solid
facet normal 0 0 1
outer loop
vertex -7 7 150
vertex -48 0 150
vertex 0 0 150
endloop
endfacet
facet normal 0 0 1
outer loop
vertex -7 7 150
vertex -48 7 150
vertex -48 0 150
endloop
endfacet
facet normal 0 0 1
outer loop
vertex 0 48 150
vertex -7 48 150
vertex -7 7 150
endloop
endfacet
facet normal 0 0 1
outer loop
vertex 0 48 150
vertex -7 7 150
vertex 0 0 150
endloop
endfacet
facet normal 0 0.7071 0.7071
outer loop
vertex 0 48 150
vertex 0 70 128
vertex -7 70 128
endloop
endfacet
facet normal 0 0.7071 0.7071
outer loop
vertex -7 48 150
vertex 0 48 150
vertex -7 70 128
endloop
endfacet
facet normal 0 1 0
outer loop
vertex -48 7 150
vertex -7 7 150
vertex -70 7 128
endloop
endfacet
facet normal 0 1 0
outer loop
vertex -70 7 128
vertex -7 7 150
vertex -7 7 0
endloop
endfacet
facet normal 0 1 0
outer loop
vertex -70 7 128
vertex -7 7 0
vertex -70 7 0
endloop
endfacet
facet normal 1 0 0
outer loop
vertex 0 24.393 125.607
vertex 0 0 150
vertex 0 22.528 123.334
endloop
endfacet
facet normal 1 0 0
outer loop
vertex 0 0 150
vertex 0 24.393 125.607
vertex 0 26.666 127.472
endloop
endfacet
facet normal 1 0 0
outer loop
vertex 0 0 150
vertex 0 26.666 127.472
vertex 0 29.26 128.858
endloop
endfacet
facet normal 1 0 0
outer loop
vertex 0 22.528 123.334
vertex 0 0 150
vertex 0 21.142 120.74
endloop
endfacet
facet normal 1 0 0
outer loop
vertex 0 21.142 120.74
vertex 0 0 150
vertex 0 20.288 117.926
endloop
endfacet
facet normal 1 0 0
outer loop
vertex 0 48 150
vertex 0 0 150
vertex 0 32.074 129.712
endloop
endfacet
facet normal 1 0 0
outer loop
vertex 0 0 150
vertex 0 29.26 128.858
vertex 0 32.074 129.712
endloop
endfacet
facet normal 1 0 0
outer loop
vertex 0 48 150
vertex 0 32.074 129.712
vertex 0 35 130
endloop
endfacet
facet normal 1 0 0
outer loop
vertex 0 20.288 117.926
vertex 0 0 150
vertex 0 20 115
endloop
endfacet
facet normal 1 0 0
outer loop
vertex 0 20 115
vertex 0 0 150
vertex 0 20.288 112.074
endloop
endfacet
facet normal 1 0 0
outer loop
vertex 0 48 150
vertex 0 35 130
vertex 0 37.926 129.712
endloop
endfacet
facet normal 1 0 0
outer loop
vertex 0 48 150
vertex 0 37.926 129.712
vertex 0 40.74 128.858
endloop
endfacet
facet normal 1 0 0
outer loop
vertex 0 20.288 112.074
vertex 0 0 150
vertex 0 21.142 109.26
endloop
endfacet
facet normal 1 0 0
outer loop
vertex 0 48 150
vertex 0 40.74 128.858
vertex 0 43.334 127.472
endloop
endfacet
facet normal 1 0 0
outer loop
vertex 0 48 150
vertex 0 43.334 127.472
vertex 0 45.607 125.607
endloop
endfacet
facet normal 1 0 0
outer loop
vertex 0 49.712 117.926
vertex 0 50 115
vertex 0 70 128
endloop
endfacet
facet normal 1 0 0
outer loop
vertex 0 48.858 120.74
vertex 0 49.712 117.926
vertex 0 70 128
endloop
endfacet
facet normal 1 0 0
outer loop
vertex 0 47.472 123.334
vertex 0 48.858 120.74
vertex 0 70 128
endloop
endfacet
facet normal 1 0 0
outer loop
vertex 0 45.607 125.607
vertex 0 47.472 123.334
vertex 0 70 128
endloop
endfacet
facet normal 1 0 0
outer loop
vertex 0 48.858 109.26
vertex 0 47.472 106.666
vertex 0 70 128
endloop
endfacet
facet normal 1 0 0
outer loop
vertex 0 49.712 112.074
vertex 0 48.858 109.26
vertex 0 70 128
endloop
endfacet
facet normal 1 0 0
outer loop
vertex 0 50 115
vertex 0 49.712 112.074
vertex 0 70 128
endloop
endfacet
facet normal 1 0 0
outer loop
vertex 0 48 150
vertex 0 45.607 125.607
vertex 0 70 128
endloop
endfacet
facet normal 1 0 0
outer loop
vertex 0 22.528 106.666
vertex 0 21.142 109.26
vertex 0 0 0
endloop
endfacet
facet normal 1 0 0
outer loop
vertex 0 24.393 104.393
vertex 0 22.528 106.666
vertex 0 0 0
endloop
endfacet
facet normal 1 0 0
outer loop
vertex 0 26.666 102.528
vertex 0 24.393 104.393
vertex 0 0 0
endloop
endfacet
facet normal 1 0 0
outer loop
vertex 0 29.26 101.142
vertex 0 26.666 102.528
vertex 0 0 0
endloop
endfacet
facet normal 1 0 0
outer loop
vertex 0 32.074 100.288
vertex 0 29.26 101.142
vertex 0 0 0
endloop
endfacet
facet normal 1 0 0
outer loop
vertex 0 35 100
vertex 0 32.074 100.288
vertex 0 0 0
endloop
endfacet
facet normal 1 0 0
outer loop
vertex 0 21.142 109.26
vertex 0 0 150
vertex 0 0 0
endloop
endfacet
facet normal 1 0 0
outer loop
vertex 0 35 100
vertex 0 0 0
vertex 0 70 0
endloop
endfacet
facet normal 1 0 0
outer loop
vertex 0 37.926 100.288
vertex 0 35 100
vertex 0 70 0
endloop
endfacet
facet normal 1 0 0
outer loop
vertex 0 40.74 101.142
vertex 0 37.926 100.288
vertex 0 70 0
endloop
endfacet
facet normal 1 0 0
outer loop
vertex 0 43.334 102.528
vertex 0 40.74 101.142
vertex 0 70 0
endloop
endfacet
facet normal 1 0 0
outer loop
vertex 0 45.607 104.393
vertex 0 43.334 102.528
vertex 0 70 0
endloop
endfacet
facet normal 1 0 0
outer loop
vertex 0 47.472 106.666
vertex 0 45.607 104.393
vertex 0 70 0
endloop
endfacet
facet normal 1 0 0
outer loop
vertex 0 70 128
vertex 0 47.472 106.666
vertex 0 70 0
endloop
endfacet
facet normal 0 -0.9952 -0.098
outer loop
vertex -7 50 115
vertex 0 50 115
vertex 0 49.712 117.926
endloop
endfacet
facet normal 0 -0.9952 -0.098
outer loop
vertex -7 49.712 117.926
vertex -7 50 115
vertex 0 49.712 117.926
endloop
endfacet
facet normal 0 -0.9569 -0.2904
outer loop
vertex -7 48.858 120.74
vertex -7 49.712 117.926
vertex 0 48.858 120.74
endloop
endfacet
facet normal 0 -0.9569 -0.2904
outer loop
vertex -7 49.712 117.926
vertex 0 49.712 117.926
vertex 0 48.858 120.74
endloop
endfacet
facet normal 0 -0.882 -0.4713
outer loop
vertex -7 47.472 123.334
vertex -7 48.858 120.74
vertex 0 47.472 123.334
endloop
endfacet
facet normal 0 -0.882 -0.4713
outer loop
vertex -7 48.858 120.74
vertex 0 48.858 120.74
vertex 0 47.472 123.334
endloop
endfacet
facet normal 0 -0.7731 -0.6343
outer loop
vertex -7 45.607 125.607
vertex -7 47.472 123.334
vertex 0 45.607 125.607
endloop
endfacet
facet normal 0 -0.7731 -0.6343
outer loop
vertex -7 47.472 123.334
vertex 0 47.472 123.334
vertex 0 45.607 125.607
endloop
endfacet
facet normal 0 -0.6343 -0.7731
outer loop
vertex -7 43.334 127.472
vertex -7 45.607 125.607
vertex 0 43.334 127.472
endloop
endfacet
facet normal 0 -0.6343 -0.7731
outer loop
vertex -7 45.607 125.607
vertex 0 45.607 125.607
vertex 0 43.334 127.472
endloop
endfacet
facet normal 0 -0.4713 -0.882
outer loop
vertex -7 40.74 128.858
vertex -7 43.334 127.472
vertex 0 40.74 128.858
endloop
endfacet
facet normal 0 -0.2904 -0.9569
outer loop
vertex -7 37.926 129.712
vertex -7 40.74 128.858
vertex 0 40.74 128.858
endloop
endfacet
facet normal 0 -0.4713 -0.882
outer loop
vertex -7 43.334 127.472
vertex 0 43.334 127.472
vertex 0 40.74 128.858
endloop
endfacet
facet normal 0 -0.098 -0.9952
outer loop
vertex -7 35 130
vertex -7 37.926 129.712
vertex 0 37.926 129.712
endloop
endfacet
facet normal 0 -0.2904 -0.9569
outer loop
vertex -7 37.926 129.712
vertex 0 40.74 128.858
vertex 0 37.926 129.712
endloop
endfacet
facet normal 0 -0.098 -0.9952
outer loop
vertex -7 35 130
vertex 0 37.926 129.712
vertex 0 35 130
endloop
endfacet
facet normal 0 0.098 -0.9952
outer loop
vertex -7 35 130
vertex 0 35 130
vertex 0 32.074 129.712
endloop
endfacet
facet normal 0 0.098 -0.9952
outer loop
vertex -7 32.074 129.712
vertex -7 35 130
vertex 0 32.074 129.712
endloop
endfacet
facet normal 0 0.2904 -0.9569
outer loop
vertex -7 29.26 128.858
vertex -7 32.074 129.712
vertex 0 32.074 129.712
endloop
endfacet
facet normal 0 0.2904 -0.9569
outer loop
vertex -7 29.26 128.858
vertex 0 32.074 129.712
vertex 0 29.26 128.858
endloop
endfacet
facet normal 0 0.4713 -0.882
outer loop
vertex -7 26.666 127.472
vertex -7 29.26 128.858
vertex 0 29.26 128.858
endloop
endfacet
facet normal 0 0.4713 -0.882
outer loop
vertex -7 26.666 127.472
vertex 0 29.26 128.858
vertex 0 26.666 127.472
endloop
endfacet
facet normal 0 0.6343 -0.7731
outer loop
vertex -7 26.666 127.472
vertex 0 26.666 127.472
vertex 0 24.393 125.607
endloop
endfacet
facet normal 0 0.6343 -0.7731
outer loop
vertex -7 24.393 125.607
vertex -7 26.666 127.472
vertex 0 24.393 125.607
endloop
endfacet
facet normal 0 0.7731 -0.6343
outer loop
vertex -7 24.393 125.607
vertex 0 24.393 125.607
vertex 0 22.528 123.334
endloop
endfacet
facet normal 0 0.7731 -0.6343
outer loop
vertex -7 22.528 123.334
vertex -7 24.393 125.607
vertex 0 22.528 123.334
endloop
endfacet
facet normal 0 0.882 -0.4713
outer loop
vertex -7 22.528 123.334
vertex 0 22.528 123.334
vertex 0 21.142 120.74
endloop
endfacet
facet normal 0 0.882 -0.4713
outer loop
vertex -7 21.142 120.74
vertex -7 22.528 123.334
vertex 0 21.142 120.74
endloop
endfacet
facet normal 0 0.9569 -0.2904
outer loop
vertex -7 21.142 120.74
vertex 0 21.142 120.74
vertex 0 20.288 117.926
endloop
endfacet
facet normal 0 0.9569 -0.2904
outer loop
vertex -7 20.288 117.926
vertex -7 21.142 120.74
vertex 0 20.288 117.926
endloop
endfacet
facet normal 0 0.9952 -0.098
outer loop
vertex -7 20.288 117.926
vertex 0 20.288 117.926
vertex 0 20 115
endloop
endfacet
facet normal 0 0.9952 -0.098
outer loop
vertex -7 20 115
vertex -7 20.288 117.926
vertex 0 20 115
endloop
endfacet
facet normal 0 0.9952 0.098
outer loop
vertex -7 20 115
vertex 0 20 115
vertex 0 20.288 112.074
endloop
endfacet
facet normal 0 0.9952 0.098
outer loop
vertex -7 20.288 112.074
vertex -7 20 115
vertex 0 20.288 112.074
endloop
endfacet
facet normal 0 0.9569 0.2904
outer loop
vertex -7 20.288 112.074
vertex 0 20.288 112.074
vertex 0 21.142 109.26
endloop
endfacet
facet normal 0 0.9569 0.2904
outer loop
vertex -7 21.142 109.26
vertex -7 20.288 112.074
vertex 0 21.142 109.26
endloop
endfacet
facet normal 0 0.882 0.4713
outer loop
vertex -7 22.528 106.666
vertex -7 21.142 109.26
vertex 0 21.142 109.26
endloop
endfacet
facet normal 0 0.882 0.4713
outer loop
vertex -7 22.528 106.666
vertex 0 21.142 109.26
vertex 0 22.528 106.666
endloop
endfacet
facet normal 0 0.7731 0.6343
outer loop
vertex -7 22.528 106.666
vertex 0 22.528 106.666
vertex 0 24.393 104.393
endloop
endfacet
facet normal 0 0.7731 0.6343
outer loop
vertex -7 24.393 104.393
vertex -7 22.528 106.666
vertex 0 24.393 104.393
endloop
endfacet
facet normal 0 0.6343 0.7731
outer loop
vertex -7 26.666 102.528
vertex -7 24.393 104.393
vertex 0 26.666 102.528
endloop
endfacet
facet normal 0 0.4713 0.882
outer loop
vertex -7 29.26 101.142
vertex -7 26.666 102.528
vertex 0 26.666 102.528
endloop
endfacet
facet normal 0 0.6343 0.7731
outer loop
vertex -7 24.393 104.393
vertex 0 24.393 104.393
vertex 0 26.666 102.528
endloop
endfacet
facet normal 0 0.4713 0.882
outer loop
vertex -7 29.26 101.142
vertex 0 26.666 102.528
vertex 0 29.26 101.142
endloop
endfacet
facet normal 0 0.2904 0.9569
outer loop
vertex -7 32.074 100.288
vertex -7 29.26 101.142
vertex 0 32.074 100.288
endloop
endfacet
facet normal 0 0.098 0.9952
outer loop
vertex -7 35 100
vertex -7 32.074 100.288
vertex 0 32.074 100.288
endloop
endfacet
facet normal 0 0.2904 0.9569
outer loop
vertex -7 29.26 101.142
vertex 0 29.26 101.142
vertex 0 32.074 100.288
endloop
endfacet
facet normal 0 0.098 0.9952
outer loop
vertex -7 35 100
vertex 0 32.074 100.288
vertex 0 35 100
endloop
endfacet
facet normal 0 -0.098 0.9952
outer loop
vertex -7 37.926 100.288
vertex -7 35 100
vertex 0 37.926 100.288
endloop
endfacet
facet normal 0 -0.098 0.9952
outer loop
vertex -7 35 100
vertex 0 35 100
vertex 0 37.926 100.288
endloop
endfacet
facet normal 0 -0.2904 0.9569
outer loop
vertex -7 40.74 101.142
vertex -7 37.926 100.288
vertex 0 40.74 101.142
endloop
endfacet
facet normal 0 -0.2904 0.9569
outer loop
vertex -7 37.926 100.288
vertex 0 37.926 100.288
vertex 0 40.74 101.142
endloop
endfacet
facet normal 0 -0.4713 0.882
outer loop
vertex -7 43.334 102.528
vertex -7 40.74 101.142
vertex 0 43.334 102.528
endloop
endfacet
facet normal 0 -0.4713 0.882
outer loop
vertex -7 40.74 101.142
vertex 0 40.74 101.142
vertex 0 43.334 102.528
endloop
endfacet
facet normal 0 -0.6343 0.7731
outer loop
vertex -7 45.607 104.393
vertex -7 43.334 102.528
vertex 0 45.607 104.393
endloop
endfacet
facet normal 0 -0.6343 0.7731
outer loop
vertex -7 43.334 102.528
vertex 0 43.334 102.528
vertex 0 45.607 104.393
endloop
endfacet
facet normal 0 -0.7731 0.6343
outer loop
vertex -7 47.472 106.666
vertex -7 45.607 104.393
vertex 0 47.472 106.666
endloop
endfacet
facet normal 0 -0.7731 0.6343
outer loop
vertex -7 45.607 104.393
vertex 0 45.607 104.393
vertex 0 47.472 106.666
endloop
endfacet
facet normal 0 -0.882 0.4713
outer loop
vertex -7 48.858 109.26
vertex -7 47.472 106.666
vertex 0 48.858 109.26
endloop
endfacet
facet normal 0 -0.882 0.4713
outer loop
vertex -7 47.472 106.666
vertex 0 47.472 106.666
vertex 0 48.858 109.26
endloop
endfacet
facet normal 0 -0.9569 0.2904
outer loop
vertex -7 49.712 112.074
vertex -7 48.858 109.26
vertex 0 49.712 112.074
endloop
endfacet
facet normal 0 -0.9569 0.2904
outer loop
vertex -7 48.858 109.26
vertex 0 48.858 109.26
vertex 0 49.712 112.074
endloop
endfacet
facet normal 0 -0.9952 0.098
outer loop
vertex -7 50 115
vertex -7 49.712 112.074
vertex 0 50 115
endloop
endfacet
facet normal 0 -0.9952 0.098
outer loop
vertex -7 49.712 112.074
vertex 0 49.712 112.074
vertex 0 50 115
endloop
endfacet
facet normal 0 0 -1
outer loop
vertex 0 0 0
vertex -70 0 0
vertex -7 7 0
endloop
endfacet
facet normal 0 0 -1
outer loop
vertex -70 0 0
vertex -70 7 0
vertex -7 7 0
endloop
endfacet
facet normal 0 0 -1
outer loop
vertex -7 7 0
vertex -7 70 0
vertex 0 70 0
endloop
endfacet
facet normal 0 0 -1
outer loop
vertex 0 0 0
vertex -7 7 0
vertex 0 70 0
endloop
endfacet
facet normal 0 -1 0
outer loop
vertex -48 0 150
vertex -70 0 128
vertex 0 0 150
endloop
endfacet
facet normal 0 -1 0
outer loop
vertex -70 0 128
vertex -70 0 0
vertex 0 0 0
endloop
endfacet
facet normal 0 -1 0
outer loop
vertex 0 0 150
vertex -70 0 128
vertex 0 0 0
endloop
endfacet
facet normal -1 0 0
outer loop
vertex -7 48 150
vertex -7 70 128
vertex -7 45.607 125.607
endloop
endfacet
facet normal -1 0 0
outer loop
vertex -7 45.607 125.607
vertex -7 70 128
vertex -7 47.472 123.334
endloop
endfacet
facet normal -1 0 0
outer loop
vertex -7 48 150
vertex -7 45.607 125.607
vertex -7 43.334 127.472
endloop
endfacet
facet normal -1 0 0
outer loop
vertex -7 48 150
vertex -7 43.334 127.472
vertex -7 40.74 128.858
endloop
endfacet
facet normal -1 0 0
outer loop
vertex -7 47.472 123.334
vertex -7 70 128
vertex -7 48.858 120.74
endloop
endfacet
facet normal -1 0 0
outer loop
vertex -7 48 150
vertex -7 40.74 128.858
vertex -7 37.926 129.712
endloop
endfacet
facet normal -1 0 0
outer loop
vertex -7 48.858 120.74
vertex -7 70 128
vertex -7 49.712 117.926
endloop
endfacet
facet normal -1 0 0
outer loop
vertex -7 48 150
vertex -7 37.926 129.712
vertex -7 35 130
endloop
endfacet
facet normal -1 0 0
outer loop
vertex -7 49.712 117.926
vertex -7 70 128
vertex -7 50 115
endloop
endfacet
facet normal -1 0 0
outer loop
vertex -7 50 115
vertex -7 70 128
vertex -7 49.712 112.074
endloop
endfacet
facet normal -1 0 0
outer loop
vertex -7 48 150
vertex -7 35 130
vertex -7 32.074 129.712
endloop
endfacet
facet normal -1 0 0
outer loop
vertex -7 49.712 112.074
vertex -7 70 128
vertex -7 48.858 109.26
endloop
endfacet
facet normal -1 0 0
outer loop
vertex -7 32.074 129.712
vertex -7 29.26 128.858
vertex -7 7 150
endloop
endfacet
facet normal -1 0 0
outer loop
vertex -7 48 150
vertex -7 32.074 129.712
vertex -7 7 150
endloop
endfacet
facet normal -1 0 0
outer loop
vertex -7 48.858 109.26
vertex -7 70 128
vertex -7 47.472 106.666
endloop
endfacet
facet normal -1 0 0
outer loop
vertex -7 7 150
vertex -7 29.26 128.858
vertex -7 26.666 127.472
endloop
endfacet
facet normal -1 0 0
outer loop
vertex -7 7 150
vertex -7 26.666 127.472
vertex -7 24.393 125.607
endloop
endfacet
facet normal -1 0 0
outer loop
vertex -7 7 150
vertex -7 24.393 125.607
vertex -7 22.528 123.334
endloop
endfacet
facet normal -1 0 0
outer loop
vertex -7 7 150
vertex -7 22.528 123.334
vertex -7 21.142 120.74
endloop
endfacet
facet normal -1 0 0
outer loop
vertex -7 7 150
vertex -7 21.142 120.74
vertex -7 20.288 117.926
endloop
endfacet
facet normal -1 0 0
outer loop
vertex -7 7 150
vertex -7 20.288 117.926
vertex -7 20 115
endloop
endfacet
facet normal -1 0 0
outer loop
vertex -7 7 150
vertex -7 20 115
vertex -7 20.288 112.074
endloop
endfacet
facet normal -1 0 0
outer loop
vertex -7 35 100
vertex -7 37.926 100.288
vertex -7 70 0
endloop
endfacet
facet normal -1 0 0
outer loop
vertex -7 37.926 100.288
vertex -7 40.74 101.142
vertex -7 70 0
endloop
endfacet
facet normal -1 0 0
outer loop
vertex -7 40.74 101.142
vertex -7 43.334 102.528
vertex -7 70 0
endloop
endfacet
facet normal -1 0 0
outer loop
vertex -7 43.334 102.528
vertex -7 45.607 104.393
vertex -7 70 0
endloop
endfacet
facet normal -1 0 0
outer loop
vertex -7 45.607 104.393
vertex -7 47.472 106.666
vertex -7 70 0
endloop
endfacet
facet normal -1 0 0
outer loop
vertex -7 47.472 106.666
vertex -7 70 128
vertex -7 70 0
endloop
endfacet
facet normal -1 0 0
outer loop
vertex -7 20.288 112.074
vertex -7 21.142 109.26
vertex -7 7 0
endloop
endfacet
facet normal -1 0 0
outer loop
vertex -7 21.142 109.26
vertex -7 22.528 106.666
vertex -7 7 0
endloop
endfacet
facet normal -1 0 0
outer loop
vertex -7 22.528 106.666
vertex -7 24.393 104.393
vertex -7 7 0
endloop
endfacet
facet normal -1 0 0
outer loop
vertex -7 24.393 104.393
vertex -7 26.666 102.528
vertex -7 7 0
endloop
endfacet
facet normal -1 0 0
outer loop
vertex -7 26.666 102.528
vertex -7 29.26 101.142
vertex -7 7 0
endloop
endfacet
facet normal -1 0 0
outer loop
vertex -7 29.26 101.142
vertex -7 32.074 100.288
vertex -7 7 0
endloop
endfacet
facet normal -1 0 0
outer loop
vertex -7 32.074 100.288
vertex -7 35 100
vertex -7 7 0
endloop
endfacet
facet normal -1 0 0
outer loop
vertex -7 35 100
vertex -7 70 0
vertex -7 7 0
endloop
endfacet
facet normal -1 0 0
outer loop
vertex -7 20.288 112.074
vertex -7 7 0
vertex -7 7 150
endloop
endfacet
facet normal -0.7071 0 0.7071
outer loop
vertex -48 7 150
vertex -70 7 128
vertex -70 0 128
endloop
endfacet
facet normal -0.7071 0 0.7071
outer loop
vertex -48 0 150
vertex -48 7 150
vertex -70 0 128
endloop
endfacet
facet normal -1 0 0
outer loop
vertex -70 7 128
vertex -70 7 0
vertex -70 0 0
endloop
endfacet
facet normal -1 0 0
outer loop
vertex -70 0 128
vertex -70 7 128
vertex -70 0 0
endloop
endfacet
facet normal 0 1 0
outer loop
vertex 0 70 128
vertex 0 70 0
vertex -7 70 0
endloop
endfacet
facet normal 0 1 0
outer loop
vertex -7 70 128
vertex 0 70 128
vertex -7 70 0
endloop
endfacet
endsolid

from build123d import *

# Parameters (mm, degrees)
F1_DEPTH = 150
F2_SIZE  = 22
F3_R     = 15
F4_DEPTH = 25


with BuildPart() as f1:
    # F0 (on Top) → F1 (new body)
    with BuildSketch(Plane.XY):
        Polygon((-70, 0), (0, 0), (0, 70), (-7, 70), (-7, 7), (-70, 7), align=None)
    extrude(amount=F1_DEPTH)

    # F2
    f2_edges = [f1.edges().sort_by_distance(p)[0] for p in [
        (-70, 3.5, 150),
        (-3.5, 70, 150),
    ]]
    chamfer(f2_edges, length=F2_SIZE)

    # F3 (on face) → F4 (cut)
    with BuildSketch(Plane.YZ):
        with Locations((35, 115)):
            Circle(F3_R)
    extrude(amount=-F4_DEPTH, mode=Mode.SUBTRACT)


solid = f1.part
